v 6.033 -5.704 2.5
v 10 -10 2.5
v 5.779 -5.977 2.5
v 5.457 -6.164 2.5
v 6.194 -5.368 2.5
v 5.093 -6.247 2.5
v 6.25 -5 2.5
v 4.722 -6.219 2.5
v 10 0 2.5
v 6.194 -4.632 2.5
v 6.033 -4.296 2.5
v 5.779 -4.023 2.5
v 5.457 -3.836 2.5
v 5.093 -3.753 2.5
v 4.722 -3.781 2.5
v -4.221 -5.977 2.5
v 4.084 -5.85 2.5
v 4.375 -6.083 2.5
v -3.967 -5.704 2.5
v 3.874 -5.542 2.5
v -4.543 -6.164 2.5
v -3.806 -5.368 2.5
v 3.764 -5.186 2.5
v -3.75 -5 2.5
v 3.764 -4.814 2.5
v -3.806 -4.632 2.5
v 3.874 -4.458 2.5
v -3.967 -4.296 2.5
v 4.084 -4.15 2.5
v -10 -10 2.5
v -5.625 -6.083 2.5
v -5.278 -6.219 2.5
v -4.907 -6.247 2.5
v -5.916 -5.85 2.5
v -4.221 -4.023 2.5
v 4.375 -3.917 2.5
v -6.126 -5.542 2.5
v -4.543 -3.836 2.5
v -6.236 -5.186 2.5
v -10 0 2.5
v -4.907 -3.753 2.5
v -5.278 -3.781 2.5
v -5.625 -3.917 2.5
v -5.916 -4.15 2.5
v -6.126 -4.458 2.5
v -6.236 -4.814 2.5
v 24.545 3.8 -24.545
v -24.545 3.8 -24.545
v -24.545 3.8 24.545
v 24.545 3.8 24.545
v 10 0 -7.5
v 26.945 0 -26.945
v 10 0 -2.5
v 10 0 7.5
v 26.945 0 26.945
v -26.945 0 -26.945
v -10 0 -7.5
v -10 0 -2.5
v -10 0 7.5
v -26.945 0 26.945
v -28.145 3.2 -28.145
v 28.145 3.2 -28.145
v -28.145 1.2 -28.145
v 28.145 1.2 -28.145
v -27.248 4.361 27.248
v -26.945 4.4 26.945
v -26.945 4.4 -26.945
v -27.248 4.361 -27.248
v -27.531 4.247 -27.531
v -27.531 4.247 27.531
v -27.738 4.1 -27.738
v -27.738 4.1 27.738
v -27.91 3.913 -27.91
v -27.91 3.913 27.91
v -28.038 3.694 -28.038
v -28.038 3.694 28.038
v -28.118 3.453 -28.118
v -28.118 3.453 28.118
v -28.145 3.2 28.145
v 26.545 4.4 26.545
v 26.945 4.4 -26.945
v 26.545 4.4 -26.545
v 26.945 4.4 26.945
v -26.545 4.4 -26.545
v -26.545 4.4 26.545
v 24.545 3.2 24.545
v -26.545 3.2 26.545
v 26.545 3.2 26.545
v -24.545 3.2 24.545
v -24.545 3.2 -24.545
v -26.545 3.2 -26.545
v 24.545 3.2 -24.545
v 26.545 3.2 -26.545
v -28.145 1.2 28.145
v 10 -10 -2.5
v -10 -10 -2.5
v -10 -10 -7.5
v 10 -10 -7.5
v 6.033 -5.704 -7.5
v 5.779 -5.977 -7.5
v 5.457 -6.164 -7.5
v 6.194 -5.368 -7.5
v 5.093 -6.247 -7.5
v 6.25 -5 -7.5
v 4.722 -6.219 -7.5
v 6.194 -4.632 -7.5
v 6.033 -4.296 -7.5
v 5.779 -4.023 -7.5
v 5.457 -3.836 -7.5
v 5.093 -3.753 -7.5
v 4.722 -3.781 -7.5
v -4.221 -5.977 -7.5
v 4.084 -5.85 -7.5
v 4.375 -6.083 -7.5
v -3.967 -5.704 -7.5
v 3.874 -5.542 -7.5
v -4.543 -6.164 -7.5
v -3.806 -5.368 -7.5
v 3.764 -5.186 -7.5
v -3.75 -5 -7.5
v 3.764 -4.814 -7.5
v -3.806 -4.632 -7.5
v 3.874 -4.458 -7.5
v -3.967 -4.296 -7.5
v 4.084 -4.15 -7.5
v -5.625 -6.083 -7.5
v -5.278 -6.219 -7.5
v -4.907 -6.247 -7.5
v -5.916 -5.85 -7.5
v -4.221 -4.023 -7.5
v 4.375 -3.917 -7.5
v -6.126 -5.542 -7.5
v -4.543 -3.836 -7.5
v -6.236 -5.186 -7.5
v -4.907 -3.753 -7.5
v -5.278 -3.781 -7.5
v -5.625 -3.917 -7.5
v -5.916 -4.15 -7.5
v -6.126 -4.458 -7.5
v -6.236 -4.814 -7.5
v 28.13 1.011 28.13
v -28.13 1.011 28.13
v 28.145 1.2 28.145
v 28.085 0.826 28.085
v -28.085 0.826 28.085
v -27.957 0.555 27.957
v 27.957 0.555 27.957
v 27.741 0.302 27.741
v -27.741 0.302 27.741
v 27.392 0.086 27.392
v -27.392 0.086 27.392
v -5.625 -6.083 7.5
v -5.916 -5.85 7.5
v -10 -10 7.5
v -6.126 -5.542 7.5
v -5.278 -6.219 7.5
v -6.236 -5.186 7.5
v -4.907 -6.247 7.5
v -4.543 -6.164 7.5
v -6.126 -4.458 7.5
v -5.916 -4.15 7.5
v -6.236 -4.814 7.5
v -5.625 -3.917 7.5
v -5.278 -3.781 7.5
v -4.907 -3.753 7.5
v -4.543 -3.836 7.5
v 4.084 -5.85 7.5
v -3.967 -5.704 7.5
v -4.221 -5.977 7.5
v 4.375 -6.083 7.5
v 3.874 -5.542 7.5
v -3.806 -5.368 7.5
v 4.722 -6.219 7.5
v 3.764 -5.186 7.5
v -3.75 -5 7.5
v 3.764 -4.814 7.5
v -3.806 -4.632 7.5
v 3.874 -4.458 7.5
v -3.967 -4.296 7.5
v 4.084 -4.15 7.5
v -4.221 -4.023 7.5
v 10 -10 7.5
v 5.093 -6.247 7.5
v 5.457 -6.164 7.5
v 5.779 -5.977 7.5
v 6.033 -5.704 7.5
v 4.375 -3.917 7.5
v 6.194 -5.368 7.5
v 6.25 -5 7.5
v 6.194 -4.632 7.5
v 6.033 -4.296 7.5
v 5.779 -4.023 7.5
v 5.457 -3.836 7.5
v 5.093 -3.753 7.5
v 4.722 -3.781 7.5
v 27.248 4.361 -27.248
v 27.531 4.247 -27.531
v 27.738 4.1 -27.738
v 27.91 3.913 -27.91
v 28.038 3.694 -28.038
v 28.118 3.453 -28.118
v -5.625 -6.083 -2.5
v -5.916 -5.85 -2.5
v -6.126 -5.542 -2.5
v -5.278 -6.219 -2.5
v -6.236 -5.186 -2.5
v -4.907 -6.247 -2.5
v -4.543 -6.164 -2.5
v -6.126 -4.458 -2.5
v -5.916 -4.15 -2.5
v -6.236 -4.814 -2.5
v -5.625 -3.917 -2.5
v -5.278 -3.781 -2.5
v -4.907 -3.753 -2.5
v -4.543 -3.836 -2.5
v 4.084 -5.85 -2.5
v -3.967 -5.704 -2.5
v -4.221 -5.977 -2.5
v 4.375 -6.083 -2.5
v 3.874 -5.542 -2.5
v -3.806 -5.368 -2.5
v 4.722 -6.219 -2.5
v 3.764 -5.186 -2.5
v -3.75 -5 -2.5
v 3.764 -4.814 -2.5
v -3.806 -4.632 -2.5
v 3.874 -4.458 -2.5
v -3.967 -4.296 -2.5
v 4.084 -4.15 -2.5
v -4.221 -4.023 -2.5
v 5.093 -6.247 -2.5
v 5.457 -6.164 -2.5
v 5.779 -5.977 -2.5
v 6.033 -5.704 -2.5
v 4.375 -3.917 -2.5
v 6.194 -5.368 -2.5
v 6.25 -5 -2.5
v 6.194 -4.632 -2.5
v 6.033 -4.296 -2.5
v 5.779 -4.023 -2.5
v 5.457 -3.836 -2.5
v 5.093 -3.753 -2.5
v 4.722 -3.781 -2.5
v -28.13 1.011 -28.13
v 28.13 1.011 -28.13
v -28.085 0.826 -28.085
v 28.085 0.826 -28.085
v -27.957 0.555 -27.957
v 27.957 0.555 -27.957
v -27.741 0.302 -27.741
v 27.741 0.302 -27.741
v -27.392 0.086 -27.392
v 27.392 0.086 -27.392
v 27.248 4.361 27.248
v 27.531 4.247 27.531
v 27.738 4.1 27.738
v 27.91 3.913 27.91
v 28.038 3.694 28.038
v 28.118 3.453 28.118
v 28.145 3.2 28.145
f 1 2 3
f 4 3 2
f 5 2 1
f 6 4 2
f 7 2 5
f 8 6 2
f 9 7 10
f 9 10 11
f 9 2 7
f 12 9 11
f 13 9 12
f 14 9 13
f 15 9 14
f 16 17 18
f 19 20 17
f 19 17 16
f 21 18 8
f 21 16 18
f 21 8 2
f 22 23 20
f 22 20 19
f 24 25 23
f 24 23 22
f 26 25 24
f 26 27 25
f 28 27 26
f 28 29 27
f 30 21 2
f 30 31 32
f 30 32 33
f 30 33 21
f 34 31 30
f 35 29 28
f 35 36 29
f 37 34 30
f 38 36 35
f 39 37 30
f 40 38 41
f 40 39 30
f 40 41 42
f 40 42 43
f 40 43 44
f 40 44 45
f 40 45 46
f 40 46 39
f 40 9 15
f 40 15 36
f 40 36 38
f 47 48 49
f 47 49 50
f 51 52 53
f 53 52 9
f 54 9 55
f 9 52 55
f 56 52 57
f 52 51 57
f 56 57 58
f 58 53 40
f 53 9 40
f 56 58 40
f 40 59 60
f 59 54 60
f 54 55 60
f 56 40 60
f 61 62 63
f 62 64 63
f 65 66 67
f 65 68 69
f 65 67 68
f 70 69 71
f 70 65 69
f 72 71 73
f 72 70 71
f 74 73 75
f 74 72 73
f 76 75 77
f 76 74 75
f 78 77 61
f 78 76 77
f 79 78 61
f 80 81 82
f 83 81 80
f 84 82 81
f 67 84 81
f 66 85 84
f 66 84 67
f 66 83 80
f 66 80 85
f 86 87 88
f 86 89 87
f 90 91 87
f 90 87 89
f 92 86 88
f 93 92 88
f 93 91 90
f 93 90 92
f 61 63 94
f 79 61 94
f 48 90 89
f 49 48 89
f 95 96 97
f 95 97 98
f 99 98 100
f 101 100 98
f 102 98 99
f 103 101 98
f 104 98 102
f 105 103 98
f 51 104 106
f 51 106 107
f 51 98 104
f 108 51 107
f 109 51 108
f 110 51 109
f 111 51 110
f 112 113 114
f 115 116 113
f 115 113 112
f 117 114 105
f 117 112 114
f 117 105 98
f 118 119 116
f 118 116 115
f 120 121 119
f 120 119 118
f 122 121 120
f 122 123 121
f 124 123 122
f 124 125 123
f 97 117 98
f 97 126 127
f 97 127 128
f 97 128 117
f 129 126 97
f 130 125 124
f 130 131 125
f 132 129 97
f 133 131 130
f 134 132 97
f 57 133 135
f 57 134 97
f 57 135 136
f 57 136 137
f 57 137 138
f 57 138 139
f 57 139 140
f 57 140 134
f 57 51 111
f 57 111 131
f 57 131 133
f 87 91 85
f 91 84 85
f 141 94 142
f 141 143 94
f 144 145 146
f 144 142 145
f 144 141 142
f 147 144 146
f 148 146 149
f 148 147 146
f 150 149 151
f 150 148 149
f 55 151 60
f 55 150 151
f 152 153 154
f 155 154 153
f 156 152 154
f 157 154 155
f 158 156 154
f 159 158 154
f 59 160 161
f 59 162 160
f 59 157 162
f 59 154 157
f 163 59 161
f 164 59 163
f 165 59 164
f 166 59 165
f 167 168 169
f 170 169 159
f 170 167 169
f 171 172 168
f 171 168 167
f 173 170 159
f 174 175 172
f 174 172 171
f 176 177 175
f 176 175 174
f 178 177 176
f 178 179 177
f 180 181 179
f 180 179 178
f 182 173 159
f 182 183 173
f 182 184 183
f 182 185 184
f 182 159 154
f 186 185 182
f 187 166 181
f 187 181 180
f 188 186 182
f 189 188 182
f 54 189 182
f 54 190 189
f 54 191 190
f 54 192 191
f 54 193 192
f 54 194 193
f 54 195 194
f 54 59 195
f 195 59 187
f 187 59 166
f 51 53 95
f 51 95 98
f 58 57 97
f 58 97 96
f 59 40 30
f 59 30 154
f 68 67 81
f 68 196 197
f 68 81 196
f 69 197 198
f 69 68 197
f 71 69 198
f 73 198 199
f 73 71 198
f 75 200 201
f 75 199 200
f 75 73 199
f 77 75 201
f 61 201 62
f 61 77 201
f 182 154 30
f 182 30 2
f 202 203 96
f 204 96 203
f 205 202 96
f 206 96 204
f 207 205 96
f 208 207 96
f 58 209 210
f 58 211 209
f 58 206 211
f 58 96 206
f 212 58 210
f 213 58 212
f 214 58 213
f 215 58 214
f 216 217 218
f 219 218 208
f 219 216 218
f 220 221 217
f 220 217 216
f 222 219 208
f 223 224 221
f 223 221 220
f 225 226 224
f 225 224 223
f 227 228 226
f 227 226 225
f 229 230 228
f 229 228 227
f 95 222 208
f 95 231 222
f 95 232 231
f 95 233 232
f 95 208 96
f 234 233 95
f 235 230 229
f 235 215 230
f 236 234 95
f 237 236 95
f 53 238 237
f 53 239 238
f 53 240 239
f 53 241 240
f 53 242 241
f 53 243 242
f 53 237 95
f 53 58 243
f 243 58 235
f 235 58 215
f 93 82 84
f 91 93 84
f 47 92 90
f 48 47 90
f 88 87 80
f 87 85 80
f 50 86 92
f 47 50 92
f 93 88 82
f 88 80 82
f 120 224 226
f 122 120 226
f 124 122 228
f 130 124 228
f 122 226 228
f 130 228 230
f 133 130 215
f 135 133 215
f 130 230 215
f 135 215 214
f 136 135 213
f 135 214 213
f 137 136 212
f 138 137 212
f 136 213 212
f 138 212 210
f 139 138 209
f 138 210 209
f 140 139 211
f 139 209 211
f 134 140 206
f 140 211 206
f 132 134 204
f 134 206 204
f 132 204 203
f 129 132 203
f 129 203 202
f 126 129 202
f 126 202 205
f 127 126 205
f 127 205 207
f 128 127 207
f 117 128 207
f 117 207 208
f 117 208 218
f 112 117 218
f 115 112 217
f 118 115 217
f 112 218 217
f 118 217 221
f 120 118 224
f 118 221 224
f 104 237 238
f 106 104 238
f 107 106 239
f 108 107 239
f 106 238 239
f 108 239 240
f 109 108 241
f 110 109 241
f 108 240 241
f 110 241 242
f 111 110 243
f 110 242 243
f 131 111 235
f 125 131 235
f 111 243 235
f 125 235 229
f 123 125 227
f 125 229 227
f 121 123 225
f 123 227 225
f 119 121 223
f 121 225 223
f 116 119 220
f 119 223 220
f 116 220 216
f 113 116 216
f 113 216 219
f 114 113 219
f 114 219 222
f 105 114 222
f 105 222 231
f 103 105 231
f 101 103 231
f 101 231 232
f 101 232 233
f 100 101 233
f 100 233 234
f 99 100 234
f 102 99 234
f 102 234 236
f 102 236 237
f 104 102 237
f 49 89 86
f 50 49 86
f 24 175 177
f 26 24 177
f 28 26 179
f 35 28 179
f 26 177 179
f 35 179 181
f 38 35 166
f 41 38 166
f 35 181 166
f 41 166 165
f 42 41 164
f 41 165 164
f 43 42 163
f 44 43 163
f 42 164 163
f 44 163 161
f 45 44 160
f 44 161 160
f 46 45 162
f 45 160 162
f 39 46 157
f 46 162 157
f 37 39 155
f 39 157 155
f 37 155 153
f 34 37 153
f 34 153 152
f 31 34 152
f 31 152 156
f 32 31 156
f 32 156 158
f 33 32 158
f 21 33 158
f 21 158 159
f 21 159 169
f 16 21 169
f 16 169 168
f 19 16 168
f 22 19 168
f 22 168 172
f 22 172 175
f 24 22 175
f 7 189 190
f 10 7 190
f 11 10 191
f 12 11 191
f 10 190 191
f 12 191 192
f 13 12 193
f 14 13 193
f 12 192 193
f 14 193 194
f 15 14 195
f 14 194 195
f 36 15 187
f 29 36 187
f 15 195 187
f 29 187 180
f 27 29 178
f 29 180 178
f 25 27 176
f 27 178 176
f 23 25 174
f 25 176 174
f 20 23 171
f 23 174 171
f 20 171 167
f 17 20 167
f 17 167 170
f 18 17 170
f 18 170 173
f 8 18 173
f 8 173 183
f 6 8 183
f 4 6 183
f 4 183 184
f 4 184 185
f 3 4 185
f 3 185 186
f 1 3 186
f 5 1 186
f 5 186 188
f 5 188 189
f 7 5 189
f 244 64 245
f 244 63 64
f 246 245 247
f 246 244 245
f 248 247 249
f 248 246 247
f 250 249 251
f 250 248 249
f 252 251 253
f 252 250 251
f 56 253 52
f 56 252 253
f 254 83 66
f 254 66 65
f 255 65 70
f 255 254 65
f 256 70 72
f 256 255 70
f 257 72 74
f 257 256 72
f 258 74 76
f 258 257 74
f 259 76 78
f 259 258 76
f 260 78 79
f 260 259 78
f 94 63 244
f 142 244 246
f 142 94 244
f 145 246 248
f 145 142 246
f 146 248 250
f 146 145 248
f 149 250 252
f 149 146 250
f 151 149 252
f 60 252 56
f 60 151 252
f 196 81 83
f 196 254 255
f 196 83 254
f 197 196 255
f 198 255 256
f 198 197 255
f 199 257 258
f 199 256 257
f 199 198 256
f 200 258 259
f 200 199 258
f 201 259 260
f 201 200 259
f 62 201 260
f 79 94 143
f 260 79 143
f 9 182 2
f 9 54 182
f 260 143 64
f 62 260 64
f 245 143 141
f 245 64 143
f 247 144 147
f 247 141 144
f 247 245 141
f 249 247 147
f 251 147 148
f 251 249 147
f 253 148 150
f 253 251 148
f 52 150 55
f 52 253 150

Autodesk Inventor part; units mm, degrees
ref_plane "YZ Plane" through (0, 0, 0) normal (1, 0, 0) x (0, 1, 0)
ref_plane "XZ Plane" through (0, 0, 0) normal (0, 1, 0) x (-1, 0, 0)
ref_plane "XY Plane" through (0, 0, 0) normal (0, 0, 1) x (1, 0, 0)
sketch "스케치1" plane through (0, 0, 0) normal (0, 1, 0) x (-1, 0, 0)
  line L0 (-24.9446, -24.9446) -> (24.9446, -24.9446)
  line L1 (24.9446, -24.9446) -> (24.9446, 24.9446)
  line L2 (24.9446, 24.9446) -> (-24.9446, 24.9446)
  line L3 (-24.9446, 24.9446) -> (-24.9446, -24.9446)
  line L4 (-24.9446, -24.9446) -> (24.9446, 24.9446) construction
  line L5 (24.9446, -24.9446) -> (-24.9446, 24.9446) construction
  line L6 (-28.1446, -28.1446) -> (28.1446, -28.1446)
  line L7 (28.1446, -28.1446) -> (28.1446, 28.1446)
  line L8 (28.1446, 28.1446) -> (-28.1446, 28.1446)
  line L9 (-28.1446, 28.1446) -> (-28.1446, -28.1446)
  line L10 (-28.1446, -28.1446) -> (28.1446, 28.1446) construction
  line L11 (28.1446, -28.1446) -> (-28.1446, 28.1446) construction
  point P0 (0, 0)
  dimension "d0" = 70.554
  dimension "d1" = 3.2
extrude "돌출1" add sketch "스케치1" along normal blind 4.4 contours L3 L2 L1 L0 | L9 L8 L7 L6
sketch "스케치2" plane through (0, 4.4, 0) normal (0, 1, 0) x (1, 0, 0)
  line L0 (-28.1446, 28.1446) -> (-28.1446, -28.1446) projected
  line L1 (-28.1446, -28.1446) -> (28.1446, -28.1446) projected
  line L2 (28.1446, -28.1446) -> (28.1446, 28.1446) projected
  line L3 (28.1446, 28.1446) -> (-28.1446, 28.1446) projected
  line L4 (26.5446, 26.5446) -> (-26.5446, 26.5446)
  line L5 (-26.5446, 26.5446) -> (-26.5446, -26.5446)
  line L6 (-26.5446, -26.5446) -> (26.5446, -26.5446)
  line L7 (26.5446, -26.5446) -> (26.5446, 26.5446)
  line L8 (26.5446, 26.5446) -> (-26.5446, -26.5446) construction
  line L9 (-26.5446, 26.5446) -> (26.5446, -26.5446) construction
  line L10 (24.5446, 24.5446) -> (-24.5446, 24.5446)
  line L11 (-24.5446, 24.5446) -> (-24.5446, -24.5446)
  line L12 (-24.5446, -24.5446) -> (24.5446, -24.5446)
  line L13 (24.5446, -24.5446) -> (24.5446, 24.5446)
  line L14 (24.5446, 24.5446) -> (-24.5446, -24.5446) construction
  line L15 (-24.5446, 24.5446) -> (24.5446, -24.5446) construction
  point P0 (0, 0)
  point P1 (0, 28.1446)
  point P2 (-28.1446, 0)
  dimension "d4" = 1.6
  dimension "d5" = 2
extrude "돌출2" cut sketch "스케치2" against normal blind 1.2 contours L7 L6 L5 L4 | L13 L12 L11 L10
sketch "스케치3" plane through (0, 3.2, 0) normal (0, 1, 0) x (1, 0, 0)
  line L0 (24.5446, 24.5446) -> (-24.5446, 24.5446)
  line L1 (-24.5446, 24.5446) -> (-24.5446, -24.5446)
  line L2 (-24.5446, -24.5446) -> (24.5446, -24.5446)
  line L3 (24.5446, -24.5446) -> (24.5446, 24.5446)
  line L4 (24.5446, 24.5446) -> (-24.5446, -24.5446) construction
  line L5 (-24.5446, 24.5446) -> (24.5446, -24.5446) construction
  line L6 (-26.5446, -26.5446) -> (-26.5446, 26.5446) projected
  point P0 (0, 0)
  dimension "d8" = 2
extrude "돌출3" add sketch "스케치3" along normal blind 0.6
sketch "스케치4" plane through (0, 0, 0) normal (0, -1, 0) x (1, 0, 0)
  line L0 (-10, 7.5) -> (10, 7.5)
  line L1 (10, 7.5) -> (10, 2.5)
  line L2 (10, 2.5) -> (-10, 2.5)
  line L3 (-10, 2.5) -> (-10, 7.5)
  line L4 (-10, 7.5) -> (10, 2.5) construction
  line L5 (10, 7.5) -> (-10, 2.5) construction
  line L6 (-10, -2.5) -> (10, -2.5)
  line L7 (10, -2.5) -> (10, -7.5)
  line L8 (10, -7.5) -> (-10, -7.5)
  line L9 (-10, -7.5) -> (-10, -2.5)
  line L10 (-10, -2.5) -> (10, -7.5) construction
  line L11 (10, -2.5) -> (-10, -7.5) construction
  point P0 (0, 0)
  point P1 (0, 5)
  point P2 (0, -5)
  dimension "d11" = 5
  dimension "d12" = 5
  dimension "d13" = 20
  dimension "d14" = 20
  dimension "d15" = 5
  dimension "d16" = 2.5
extrude "돌출4" add sketch "스케치4" along normal blind 10
sketch "스케치5" plane through (-10, 0, 7.5) normal (0, 0, 1) x (1, 0, 0)
  circle A0 centre (15, -5) radius 1.25
  circle A1 centre (5, -5) radius 1.25
  line L0 (-18.1446, 0) -> (38.1446, 0) projected
  line L1 (0, 0) -> (0, -10) projected
  point P0 (10, 0)
  dimension "d19" = 2.5
  dimension "d20" = 2.5
  dimension "d21" = 10
  dimension "d22" = 5
  dimension "d23" = 5
extrude "돌출5" cut sketch "스케치5" against normal up to surface (15 mm away)
fillet "모깎기1" radius 1.2 8 edges at (0, 4.4, 28.1446) (28.1446, 4.4, 0) (0, 4.4, -28.1446) (-28.1446, 4.4, 0) (-28.1446, 0, 0) (0, 0, 28.1446) (28.1446, 0, 0) (0, 0, -28.1446)
equation "\"d16\" = 0.5 * d15"
properties part number "OV-PAM_n_4_bottom"
